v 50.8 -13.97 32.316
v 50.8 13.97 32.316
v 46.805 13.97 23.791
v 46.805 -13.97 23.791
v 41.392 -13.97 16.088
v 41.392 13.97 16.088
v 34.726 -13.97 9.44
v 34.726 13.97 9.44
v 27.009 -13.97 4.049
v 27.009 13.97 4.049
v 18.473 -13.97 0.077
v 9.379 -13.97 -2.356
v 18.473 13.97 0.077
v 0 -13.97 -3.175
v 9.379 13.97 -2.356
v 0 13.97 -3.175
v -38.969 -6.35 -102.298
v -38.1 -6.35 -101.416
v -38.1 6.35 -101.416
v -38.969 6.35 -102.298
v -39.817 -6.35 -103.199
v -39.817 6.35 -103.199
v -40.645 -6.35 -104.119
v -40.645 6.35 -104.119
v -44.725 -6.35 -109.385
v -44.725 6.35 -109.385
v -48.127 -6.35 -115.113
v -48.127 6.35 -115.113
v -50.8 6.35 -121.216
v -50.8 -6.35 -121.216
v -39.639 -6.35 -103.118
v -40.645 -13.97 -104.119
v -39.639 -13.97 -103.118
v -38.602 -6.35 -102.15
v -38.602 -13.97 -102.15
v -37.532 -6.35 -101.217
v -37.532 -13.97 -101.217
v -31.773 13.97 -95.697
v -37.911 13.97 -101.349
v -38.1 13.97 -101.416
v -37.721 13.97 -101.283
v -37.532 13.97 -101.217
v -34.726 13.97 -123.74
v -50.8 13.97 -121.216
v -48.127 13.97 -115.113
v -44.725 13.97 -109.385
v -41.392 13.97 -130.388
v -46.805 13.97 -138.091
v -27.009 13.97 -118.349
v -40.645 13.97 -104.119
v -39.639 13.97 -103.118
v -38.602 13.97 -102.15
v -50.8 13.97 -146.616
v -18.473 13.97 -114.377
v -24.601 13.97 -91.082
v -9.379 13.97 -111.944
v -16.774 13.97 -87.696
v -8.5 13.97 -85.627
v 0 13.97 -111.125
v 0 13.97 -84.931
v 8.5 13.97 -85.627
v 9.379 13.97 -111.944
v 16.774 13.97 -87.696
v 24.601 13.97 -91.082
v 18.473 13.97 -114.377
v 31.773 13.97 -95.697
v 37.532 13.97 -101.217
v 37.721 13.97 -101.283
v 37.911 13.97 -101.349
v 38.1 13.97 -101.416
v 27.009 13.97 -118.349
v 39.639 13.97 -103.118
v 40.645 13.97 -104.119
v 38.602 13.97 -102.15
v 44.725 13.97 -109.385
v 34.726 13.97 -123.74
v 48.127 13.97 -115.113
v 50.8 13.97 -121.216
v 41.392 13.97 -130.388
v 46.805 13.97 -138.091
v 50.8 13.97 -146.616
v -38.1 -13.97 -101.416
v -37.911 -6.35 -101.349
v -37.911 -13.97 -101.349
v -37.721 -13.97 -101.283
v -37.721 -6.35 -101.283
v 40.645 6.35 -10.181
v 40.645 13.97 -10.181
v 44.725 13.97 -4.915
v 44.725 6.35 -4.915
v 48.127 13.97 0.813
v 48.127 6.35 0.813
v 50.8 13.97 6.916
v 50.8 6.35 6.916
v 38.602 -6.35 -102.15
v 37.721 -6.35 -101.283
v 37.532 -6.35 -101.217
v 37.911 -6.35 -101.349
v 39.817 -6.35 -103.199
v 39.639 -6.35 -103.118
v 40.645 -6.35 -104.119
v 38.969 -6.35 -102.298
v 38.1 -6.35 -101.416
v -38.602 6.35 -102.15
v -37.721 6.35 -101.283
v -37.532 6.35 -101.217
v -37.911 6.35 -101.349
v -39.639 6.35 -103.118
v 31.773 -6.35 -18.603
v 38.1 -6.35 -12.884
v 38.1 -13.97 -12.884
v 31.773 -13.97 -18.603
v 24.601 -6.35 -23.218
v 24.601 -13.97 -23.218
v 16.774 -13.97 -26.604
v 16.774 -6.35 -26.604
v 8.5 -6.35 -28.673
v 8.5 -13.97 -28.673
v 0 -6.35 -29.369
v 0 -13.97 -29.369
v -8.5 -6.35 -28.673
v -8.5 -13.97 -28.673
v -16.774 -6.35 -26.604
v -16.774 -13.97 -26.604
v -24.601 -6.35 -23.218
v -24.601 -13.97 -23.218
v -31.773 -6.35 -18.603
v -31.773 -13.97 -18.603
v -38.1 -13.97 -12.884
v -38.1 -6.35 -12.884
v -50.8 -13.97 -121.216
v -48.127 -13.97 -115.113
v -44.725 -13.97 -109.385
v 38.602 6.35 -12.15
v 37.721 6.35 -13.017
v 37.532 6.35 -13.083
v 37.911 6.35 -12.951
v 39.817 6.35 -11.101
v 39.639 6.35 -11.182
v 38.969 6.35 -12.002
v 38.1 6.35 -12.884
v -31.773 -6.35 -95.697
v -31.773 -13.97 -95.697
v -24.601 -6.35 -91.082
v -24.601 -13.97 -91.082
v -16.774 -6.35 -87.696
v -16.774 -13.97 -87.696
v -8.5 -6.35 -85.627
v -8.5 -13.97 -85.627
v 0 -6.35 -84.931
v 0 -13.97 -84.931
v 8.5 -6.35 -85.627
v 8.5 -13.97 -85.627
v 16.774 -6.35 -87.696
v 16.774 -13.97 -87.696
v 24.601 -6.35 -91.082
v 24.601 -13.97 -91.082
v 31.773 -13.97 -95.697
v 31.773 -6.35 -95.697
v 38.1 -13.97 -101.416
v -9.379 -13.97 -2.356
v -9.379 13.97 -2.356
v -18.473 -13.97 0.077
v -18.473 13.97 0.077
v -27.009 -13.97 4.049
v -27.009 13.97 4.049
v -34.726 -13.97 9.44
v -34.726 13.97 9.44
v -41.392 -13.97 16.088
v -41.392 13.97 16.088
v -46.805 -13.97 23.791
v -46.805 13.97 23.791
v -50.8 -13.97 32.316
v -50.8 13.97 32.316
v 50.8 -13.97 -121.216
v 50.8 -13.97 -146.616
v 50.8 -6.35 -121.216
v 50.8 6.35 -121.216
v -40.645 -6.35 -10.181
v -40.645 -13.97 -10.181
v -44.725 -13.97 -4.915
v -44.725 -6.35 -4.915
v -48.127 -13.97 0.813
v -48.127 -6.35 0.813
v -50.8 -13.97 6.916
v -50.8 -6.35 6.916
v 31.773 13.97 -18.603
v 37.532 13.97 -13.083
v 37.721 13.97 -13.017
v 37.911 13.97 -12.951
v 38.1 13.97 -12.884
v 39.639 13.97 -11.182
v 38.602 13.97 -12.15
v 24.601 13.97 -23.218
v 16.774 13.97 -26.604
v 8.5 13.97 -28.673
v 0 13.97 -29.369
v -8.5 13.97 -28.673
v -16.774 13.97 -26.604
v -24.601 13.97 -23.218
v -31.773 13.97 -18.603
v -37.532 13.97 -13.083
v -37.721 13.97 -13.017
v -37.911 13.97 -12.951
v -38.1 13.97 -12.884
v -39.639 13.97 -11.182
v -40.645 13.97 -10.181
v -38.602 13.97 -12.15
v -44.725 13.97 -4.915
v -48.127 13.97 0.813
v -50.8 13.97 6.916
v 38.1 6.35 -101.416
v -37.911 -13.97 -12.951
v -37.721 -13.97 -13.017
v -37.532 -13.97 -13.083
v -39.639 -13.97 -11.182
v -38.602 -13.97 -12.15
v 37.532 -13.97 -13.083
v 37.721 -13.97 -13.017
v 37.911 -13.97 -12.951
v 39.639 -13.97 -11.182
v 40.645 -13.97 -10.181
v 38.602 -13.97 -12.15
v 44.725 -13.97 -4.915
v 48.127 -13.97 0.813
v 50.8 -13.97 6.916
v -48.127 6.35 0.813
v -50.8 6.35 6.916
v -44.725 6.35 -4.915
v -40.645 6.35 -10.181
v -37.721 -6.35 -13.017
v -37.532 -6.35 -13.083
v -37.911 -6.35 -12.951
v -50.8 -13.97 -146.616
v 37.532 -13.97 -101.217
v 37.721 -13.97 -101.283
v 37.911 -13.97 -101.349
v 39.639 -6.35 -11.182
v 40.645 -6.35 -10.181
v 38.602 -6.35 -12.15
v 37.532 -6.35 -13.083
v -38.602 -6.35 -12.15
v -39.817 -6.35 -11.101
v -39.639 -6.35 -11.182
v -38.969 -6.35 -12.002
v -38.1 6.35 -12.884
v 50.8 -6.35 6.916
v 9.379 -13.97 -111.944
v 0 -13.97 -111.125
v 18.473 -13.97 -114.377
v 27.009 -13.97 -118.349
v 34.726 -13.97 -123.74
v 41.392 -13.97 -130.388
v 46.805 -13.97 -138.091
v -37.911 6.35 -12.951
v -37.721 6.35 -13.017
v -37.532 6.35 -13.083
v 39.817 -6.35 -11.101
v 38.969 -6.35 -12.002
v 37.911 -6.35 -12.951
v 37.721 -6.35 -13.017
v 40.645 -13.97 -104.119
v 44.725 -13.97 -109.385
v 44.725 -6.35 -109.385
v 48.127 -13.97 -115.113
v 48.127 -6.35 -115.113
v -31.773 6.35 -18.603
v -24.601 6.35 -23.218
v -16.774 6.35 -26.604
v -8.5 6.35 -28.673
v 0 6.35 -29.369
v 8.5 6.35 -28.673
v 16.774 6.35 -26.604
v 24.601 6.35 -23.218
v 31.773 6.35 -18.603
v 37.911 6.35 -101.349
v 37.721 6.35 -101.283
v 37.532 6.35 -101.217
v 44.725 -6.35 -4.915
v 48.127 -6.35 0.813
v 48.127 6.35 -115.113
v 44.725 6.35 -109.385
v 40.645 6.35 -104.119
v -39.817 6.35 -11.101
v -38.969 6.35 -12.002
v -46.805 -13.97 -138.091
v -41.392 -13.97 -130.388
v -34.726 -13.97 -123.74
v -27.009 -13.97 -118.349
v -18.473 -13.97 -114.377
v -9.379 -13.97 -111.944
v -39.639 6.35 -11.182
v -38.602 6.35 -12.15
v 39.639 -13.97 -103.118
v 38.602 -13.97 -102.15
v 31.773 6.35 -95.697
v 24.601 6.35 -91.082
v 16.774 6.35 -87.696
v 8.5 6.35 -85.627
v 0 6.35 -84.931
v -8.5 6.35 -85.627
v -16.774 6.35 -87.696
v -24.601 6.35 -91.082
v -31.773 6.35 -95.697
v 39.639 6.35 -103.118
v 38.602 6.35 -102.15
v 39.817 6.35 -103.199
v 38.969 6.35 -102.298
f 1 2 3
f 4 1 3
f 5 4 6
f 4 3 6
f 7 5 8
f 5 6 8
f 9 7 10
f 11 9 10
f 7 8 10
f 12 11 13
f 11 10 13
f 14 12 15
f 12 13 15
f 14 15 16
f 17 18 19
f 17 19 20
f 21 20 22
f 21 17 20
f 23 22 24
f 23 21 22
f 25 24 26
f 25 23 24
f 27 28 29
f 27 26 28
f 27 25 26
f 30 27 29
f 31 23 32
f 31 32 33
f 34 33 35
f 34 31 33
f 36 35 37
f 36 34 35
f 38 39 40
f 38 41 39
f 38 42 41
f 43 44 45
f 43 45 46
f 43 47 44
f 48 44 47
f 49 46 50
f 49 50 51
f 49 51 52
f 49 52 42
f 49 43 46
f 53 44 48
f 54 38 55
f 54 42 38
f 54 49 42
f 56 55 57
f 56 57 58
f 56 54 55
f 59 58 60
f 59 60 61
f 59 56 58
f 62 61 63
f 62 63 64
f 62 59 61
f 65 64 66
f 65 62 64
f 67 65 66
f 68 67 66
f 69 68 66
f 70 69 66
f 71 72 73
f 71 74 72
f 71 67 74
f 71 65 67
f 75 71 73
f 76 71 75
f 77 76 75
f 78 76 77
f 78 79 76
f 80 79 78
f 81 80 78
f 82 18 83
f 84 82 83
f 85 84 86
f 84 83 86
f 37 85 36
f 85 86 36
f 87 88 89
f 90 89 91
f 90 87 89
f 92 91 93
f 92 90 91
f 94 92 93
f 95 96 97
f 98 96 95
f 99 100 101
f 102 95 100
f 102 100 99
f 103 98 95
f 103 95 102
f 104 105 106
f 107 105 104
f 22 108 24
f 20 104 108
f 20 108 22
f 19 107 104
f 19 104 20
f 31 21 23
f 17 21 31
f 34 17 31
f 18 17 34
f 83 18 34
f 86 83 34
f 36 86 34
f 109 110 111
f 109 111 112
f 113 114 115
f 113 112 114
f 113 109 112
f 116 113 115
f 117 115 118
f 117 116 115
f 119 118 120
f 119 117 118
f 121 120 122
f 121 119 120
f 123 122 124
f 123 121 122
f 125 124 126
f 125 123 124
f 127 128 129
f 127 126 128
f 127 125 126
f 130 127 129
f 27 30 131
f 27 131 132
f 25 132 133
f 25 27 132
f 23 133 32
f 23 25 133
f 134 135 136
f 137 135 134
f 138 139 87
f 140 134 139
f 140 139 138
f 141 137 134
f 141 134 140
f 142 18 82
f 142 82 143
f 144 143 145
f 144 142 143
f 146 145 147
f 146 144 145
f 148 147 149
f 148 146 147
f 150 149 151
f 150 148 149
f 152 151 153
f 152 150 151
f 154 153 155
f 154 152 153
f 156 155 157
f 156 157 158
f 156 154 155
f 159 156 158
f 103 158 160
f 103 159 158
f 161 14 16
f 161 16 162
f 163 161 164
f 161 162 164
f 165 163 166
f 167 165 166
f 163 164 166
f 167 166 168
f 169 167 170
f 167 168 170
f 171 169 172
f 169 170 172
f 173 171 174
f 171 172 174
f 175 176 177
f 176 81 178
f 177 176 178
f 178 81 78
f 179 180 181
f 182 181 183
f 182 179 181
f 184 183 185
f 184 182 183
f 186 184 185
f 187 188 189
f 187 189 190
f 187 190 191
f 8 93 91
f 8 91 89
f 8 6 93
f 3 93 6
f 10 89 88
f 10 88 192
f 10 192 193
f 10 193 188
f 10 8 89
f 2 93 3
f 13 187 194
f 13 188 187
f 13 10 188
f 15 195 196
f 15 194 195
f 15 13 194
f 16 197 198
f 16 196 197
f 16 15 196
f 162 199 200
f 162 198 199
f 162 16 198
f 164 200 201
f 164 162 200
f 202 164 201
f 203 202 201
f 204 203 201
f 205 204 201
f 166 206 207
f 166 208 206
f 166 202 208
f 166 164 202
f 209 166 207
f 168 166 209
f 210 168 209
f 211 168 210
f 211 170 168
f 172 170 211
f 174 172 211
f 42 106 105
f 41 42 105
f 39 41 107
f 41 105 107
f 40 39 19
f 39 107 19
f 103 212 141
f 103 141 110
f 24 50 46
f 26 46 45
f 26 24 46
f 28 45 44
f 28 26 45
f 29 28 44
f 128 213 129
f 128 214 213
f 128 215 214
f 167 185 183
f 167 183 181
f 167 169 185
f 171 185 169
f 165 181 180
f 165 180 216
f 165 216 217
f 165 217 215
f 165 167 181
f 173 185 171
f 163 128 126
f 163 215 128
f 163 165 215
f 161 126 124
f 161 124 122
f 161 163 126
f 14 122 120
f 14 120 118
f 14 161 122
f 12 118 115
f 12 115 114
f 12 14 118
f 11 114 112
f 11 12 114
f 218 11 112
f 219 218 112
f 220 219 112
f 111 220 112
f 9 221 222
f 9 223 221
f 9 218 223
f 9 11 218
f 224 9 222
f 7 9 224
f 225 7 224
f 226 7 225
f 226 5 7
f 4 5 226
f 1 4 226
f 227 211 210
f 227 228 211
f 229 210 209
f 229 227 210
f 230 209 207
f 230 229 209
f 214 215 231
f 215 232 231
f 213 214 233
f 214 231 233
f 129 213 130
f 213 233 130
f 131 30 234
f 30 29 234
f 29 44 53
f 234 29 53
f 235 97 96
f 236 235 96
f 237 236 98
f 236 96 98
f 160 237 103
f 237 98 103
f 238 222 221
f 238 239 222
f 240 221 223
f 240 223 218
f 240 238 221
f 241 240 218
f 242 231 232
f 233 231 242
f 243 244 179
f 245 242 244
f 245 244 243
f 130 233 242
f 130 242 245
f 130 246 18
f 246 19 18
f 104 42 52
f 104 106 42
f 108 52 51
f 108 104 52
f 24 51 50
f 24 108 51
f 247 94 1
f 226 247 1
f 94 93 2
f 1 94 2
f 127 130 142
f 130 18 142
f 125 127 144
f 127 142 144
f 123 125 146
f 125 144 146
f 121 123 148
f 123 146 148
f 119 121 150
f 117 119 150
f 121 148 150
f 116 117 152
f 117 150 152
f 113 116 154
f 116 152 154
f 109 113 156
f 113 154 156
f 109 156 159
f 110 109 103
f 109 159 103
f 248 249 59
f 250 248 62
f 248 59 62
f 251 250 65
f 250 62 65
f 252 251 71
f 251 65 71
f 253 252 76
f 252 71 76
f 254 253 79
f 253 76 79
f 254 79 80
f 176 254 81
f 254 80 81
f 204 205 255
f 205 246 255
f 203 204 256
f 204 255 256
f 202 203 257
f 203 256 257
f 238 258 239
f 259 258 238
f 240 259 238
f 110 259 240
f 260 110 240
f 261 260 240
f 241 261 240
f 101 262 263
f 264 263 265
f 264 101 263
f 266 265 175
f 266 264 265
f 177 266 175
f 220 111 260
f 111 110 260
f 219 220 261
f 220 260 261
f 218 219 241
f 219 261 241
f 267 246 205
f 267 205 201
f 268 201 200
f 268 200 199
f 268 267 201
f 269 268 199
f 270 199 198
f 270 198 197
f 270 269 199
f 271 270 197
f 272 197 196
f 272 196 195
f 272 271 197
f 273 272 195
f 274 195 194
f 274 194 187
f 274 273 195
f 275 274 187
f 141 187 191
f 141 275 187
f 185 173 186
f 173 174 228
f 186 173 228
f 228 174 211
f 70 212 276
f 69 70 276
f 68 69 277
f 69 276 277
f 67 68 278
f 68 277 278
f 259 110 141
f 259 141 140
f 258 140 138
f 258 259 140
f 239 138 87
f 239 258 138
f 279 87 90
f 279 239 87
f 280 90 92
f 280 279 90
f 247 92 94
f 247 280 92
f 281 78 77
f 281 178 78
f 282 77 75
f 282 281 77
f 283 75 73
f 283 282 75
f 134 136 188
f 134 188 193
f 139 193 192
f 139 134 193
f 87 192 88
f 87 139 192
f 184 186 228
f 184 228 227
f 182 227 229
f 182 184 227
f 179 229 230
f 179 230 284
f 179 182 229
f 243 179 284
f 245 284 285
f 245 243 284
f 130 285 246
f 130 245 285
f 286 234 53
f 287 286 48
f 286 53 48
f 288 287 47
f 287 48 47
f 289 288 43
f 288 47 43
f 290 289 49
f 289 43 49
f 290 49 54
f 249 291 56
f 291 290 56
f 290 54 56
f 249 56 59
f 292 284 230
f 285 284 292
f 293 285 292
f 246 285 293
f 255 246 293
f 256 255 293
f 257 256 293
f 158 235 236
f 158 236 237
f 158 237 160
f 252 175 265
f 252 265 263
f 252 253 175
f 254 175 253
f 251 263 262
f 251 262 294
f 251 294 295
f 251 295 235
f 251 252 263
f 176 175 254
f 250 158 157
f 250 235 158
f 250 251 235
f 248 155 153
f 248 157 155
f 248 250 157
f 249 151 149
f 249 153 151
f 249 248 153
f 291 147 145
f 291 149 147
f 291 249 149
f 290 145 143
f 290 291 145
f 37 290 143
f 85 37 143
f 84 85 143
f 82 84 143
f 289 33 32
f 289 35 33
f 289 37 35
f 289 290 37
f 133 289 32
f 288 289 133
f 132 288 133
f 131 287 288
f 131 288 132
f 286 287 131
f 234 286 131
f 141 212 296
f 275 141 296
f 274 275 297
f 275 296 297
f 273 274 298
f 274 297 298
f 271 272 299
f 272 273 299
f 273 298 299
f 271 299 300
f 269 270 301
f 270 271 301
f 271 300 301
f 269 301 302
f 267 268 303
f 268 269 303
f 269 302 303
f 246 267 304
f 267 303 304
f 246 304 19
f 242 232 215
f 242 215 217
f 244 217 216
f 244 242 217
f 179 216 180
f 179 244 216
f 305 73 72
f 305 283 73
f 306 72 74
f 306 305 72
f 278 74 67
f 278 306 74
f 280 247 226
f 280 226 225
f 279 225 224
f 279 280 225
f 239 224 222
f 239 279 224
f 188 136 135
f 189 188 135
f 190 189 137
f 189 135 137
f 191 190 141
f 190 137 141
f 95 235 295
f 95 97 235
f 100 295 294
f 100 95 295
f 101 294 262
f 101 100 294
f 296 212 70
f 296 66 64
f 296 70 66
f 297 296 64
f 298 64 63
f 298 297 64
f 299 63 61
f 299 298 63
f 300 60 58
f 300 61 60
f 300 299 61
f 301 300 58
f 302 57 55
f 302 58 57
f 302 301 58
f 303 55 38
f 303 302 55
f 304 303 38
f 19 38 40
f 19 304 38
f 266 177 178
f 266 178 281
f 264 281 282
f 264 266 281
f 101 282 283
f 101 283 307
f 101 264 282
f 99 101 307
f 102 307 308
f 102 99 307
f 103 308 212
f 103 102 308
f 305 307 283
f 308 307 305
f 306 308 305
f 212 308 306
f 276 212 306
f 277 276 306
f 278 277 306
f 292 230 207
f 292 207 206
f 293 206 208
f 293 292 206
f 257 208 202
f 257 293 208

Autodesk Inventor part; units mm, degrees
ref_plane "YZ Plane" through (0, 0, 0) normal (1, 0, 0) x (0, 1, 0)
ref_plane "XZ Plane" through (0, 0, 0) normal (0, 1, 0) x (-1, 0, 0)
ref_plane "XY Plane" through (0, 0, 0) normal (0, 0, 1) x (1, 0, 0)
sketch "Sketch1" plane through (0, 0, 0) normal (0, 1, 0) x (-1, 0, 0)
  point P0 (0, 0)
sketch "Sketch2" plane through (0, 0, 0) normal (0, 1, 0) x (-1, 0, 0)
  line L0 (0, 0) -> (38.1, 0)
  line L1 (38.1, 0) -> (38.1, -84.0465)
  arc A0 (50.8, -121.2155) -> (0, -85.725) centre (0, -139.827) ccw
  line L2 (38.1, -84.0465) -> (38.1, -101.4159)
  arc A1 (50.8, -146.6155) -> (0, -111.125) centre (0, -165.227) ccw
  line L3 (50.8, -121.2155) -> (50.8, -146.6155)
  line L4 (0, 0) -> (0, -111.125)
sketch "Sketch3" plane through (0, 0, 0) normal (0, 1, 0) x (-1, 0, 0)
  point P0 (0, 0)
  point P1 (0, 0)
  point P2 (16.5768, 0)
  point P3 (25.4, 0)
  point P4 (0, 0)
  dimension "d10" = 25.4
extrude "Extrusion1" add sketch "Sketch2" along normal blind 6.35
sketch "Sketch4" plane through (0, 6.35, 0) normal (0, 1, 0) x (1, 0, 0)
  arc A0 (-50.8, 121.2155) -> (-38.1, 101.4159) centre (0, 139.827) ccw projected
  arc A1 (-50.8, 146.6155) -> (0, 111.125) centre (0, 165.227) ccw projected
  line L0 (-50.8, 146.6155) -> (-50.8, 121.2155) projected
  line L1 (-50.8, 121.2155) -> (-50.8, 146.6155)
  line L2 (0, 111.125) -> (0, 92.3126)
  line L3 (0, 0) -> (0, 111.125) projected
  arc A2 (-42.5277, 131.7842) -> (0, 111.125) centre (0, 165.227) ccw
  arc A3 (-50.8, 121.2155) -> (0, 92.3126) centre (-9.952, 133.9155) ccw
  arc A4 (-50.8, 146.6155) -> (-44.1205, 133.9155) centre (0, 165.227) ccw
  arc A5 (-50.8, 146.6155) -> (0, 111.125) centre (0, 165.227) ccw
  point P0 (-40.6454, 104.1202)
extrude "Extrusion2" add sketch "Sketch4" along normal blind 7.62 contours L0 A1 L2 A3 A0
mirror "Mirror1" about plane through (0, 0, 0) normal (1, 0, 0) of "Extrusion1", "Extrusion2"
sketch "Sketch5" plane through (0, 6.35, 0) normal (0, 1, 0) x (1, 0, 0)
  arc A0 (38.1, 101.4159) -> (50.8, 121.2155) centre (0, 139.827) ccw projected
  arc A1 (-38.1, 101.4159) -> (38.1, 101.4159) centre (0, 137.2023) ccw
  line L0 (-38.1, 101.4159) -> (-38.1, 0) projected
  arc A2 (-38.1, 101.4159) -> (38.1, 101.4159) centre (0, 209.31) ccw
  point P0 (0, 0)
extrude "Extrusion3" add sketch "Sketch5" along normal blind 7.62
mirror "Mirror2" about plane through (0, 0, 0) normal (0, 1, 0) of "Extrusion1", "Extrusion2", "Mirror1", "Extrusion3"
sketch "Sketch6" plane through (0, 6.35, 0) normal (0, 1, 0) x (1, 0, 0)
  line L0 (-38.1, 101.4159) -> (-38.1, 0) projected
  line L1 (38.1, 101.4159) -> (38.1, 0) projected
  line L2 (-38.1, -38.1) -> (38.1, -38.1)
  line L3 (38.1, -38.1) -> (38.1, 38.1)
  line L4 (38.1, 38.1) -> (-38.1, 38.1)
  line L5 (-38.1, 38.1) -> (-38.1, -38.1)
  point P0 (0, 0)
  point P1 (-38.1, -101.4159)
  point P2 (-38.1, 38.1)
  point P3 (38.1, -101.4159)
  point P4 (-38.1, 0)
  dimension "d17" = 38.1
  dimension "d18" = 38.1
extrude "Extrusion4" cut sketch "Sketch6" against normal through all
sketch "Sketch7" plane through (0, -6.35, -137.2023) normal (0, -1, 0) x (1, 0, 0)
  point P0 (0, 137.2023)
sketch "Sketch8" plane through (-38.1, 6.35, -38.1) normal (0, 0, 1) x (1, 0, 0)
  line L0 (0, 0) -> (76.2, 0) projected
  line L1 (76.2, -12.7) -> (76.2, -20.32) projected
  line L2 (0, 0) -> (76.2, 0)
  line L3 (76.2, 0) -> (76.2, -12.7)
  line L4 (76.2, -12.7) -> (0, -12.7)
  line L5 (0, -12.7) -> (0, 0)
  point P0 (38.1, -6.35)
extrude "Extrusion5" cut sketch "Sketch8" against normal blind 12.7
sketch "Sketch9" plane through (-38.1, 6.35, -50.8) normal (0, 0, 1) x (1, 0, 0)
  line L0 (0, 0) -> (76.2, 0) projected
  line L1 (76.2, 0) -> (76.2, -12.7) projected
  line L2 (0, 0) -> (76.2, 0)
  line L3 (76.2, 0) -> (76.2, -12.7)
  line L4 (76.2, -12.7) -> (0, -12.7)
  line L5 (0, -12.7) -> (0, 0)
  point P0 (38.1, -6.35)
extrude "Extrusion6" cut sketch "Sketch9" against normal blind 25.4
sketch "Sketch10" plane through (38.1, -6.35, -101.4159) normal (1, 0, 0) x (0, 0, -1)
  point P0 (-101.4159, 6.35)
sketch "Sketch11" plane through (-38.1, 6.35, -76.2) normal (0, 0, 1) x (1, 0, 0)
  line L0 (0, -12.7) -> (-2.5454, -12.7) projected
  line L1 (76.2, 0) -> (76.2, -12.7) projected
  line L2 (0, -12.7) -> (76.2, -12.7)
  line L3 (76.2, -12.7) -> (76.2, 0)
  line L4 (76.2, 0) -> (0, 0)
  line L5 (0, 0) -> (0, -12.7)
  point P0 (38.1, -6.35)
extrude "Extrusion7" add sketch "Sketch11" along normal blind 19.05
mirror "Mirror4" about plane through (0, 0, -57.15) normal (0, 0, 1)
sketch "Sketch12" plane through (0, 13.97, 50.927) normal (0, 1, 0) x (1, 0, 0)
  point P0 (0, 50.927)
properties part number "dc motor holder 2" material "Iron, Ductile"
